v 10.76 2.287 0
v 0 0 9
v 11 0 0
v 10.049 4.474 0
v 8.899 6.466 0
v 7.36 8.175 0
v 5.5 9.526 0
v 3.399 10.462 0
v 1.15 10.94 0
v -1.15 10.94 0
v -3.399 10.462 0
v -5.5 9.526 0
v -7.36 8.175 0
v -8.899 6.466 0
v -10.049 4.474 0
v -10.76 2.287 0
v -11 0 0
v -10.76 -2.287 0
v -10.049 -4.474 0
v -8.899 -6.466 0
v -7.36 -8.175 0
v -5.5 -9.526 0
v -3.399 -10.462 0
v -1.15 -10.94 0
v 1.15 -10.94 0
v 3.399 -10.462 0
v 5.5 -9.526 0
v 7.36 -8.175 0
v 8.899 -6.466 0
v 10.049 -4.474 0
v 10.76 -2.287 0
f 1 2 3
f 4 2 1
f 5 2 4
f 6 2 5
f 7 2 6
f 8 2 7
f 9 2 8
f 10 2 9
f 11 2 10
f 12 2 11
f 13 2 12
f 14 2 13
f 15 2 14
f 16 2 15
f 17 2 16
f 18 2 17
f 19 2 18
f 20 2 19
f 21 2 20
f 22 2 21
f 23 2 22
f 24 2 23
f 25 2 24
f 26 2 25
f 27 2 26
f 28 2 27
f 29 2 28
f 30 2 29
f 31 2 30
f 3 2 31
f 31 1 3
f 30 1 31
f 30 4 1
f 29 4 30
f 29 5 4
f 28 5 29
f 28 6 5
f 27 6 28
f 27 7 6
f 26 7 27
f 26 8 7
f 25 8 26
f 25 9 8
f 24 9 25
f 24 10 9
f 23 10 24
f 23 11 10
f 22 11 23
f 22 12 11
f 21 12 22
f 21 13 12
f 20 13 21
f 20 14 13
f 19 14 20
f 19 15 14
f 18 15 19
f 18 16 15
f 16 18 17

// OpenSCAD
// Generated by SolidPython 1.0.1 on 2020-07-29 00:39:25


cylinder(h = 9, r1 = 11, r2 = 0);
/***********************************************
*********      SolidPython code:      **********
************************************************
 
# import packages: SolidPython
from solid import *
from solid.utils import *
from itertools import chain, combinations


class Resize:

    def __init__(self, scad_file):
        self.scad_file = scad_file
        #self.scad_file = import_scad(scad_file)
        # cone/cylinder param:
        self.r1 = 0
        self.r2 = 0
        self.h = 0
        # rectangular prism param:
        self.w = 0
        self.l = 0
        # ellipse param:
        self.r = 0

    # import OpenScad code (file name corresponds to shape)


    # classify shape + parameters
    def assign(self, param1, param2, param3):
        if self.scad_file == 'cone.scad':
            self.r1 = param1
            self.r2 = param2
            self.h = param3
        elif self.scad_file == 'cylinder.scad':
            self.r1 = param1
            self.r2 = param2
            self.h = param3
        elif self.scad_file == 'rectangularPrism.scad':
            self.h = param1
            self.l = param2
            self.w = param3
        else:
            self.r = param1
            self.h = param2

    # resize parameters
    def iterate(self):
        x = range(3, 20, 2)
        i = 1
        if self.scad_file == 'cone.scad':
            tempList = list(combinations(x, 2))
            for temp in tempList:
                param1 = temp[0]
                param2 = temp[1]
                filepath = 'produced_scad_files/' + 'cone' + str(param1) + '_' + str(param2) + '_' + '.scad'
                scad_render_to_file(cylinder(h=param1, r1=param2, r2=0), filepath)

        elif self.scad_file == 'cylinder.scad':
            tempList = list(combinations(x, 3))
            for temp in tempList:
                param1 = temp[0]
                param2 = temp[1]
                filepath = 'produced_scad_files/' + 'cylinder' + str(param1) + '_' + str(param2) + '_' + '.scad'
                scad_render_to_file(cylinder(h=param1, r1=param2, r2=param2), filepath)

        elif self.scad_file == 'rectangularPrism.scad':
            tempList = list(combinations(x, 3))
            for temp in tempList:
                param1 = temp[0]
                param2 = temp[1]
                param3 = temp[2]
                filepath = 'produced_scad_files/' + 'rectangularPrism' + str(param1) + '_' + str(param2) + '_' + str(
                    param3) + '.scad'
                scad_render_to_file(cube(size=(param1, param2, param3)), filepath)

        elif self.scad_file == 'ellipse.scad':
            tempList = list(combinations(x, 4))
            for temp in tempList:
                param1 = temp[0]
                param2 = temp[1]
                param3 = temp[2]
                param4 = temp[3]
                filepath = 'produced_scad_files/' + 'ellipse' + str(param1) + '_' + str(param2) + '_' + str(param3) + '_' + str(param4) + '.scad'
                scad_render_to_file(scale([param1, param2, param3])(sphere(r=param4)), filepath)

    def render_to_scadfile(self):
        scad_render_to_file(scad, 'example.scad') 
 
************************************************/
